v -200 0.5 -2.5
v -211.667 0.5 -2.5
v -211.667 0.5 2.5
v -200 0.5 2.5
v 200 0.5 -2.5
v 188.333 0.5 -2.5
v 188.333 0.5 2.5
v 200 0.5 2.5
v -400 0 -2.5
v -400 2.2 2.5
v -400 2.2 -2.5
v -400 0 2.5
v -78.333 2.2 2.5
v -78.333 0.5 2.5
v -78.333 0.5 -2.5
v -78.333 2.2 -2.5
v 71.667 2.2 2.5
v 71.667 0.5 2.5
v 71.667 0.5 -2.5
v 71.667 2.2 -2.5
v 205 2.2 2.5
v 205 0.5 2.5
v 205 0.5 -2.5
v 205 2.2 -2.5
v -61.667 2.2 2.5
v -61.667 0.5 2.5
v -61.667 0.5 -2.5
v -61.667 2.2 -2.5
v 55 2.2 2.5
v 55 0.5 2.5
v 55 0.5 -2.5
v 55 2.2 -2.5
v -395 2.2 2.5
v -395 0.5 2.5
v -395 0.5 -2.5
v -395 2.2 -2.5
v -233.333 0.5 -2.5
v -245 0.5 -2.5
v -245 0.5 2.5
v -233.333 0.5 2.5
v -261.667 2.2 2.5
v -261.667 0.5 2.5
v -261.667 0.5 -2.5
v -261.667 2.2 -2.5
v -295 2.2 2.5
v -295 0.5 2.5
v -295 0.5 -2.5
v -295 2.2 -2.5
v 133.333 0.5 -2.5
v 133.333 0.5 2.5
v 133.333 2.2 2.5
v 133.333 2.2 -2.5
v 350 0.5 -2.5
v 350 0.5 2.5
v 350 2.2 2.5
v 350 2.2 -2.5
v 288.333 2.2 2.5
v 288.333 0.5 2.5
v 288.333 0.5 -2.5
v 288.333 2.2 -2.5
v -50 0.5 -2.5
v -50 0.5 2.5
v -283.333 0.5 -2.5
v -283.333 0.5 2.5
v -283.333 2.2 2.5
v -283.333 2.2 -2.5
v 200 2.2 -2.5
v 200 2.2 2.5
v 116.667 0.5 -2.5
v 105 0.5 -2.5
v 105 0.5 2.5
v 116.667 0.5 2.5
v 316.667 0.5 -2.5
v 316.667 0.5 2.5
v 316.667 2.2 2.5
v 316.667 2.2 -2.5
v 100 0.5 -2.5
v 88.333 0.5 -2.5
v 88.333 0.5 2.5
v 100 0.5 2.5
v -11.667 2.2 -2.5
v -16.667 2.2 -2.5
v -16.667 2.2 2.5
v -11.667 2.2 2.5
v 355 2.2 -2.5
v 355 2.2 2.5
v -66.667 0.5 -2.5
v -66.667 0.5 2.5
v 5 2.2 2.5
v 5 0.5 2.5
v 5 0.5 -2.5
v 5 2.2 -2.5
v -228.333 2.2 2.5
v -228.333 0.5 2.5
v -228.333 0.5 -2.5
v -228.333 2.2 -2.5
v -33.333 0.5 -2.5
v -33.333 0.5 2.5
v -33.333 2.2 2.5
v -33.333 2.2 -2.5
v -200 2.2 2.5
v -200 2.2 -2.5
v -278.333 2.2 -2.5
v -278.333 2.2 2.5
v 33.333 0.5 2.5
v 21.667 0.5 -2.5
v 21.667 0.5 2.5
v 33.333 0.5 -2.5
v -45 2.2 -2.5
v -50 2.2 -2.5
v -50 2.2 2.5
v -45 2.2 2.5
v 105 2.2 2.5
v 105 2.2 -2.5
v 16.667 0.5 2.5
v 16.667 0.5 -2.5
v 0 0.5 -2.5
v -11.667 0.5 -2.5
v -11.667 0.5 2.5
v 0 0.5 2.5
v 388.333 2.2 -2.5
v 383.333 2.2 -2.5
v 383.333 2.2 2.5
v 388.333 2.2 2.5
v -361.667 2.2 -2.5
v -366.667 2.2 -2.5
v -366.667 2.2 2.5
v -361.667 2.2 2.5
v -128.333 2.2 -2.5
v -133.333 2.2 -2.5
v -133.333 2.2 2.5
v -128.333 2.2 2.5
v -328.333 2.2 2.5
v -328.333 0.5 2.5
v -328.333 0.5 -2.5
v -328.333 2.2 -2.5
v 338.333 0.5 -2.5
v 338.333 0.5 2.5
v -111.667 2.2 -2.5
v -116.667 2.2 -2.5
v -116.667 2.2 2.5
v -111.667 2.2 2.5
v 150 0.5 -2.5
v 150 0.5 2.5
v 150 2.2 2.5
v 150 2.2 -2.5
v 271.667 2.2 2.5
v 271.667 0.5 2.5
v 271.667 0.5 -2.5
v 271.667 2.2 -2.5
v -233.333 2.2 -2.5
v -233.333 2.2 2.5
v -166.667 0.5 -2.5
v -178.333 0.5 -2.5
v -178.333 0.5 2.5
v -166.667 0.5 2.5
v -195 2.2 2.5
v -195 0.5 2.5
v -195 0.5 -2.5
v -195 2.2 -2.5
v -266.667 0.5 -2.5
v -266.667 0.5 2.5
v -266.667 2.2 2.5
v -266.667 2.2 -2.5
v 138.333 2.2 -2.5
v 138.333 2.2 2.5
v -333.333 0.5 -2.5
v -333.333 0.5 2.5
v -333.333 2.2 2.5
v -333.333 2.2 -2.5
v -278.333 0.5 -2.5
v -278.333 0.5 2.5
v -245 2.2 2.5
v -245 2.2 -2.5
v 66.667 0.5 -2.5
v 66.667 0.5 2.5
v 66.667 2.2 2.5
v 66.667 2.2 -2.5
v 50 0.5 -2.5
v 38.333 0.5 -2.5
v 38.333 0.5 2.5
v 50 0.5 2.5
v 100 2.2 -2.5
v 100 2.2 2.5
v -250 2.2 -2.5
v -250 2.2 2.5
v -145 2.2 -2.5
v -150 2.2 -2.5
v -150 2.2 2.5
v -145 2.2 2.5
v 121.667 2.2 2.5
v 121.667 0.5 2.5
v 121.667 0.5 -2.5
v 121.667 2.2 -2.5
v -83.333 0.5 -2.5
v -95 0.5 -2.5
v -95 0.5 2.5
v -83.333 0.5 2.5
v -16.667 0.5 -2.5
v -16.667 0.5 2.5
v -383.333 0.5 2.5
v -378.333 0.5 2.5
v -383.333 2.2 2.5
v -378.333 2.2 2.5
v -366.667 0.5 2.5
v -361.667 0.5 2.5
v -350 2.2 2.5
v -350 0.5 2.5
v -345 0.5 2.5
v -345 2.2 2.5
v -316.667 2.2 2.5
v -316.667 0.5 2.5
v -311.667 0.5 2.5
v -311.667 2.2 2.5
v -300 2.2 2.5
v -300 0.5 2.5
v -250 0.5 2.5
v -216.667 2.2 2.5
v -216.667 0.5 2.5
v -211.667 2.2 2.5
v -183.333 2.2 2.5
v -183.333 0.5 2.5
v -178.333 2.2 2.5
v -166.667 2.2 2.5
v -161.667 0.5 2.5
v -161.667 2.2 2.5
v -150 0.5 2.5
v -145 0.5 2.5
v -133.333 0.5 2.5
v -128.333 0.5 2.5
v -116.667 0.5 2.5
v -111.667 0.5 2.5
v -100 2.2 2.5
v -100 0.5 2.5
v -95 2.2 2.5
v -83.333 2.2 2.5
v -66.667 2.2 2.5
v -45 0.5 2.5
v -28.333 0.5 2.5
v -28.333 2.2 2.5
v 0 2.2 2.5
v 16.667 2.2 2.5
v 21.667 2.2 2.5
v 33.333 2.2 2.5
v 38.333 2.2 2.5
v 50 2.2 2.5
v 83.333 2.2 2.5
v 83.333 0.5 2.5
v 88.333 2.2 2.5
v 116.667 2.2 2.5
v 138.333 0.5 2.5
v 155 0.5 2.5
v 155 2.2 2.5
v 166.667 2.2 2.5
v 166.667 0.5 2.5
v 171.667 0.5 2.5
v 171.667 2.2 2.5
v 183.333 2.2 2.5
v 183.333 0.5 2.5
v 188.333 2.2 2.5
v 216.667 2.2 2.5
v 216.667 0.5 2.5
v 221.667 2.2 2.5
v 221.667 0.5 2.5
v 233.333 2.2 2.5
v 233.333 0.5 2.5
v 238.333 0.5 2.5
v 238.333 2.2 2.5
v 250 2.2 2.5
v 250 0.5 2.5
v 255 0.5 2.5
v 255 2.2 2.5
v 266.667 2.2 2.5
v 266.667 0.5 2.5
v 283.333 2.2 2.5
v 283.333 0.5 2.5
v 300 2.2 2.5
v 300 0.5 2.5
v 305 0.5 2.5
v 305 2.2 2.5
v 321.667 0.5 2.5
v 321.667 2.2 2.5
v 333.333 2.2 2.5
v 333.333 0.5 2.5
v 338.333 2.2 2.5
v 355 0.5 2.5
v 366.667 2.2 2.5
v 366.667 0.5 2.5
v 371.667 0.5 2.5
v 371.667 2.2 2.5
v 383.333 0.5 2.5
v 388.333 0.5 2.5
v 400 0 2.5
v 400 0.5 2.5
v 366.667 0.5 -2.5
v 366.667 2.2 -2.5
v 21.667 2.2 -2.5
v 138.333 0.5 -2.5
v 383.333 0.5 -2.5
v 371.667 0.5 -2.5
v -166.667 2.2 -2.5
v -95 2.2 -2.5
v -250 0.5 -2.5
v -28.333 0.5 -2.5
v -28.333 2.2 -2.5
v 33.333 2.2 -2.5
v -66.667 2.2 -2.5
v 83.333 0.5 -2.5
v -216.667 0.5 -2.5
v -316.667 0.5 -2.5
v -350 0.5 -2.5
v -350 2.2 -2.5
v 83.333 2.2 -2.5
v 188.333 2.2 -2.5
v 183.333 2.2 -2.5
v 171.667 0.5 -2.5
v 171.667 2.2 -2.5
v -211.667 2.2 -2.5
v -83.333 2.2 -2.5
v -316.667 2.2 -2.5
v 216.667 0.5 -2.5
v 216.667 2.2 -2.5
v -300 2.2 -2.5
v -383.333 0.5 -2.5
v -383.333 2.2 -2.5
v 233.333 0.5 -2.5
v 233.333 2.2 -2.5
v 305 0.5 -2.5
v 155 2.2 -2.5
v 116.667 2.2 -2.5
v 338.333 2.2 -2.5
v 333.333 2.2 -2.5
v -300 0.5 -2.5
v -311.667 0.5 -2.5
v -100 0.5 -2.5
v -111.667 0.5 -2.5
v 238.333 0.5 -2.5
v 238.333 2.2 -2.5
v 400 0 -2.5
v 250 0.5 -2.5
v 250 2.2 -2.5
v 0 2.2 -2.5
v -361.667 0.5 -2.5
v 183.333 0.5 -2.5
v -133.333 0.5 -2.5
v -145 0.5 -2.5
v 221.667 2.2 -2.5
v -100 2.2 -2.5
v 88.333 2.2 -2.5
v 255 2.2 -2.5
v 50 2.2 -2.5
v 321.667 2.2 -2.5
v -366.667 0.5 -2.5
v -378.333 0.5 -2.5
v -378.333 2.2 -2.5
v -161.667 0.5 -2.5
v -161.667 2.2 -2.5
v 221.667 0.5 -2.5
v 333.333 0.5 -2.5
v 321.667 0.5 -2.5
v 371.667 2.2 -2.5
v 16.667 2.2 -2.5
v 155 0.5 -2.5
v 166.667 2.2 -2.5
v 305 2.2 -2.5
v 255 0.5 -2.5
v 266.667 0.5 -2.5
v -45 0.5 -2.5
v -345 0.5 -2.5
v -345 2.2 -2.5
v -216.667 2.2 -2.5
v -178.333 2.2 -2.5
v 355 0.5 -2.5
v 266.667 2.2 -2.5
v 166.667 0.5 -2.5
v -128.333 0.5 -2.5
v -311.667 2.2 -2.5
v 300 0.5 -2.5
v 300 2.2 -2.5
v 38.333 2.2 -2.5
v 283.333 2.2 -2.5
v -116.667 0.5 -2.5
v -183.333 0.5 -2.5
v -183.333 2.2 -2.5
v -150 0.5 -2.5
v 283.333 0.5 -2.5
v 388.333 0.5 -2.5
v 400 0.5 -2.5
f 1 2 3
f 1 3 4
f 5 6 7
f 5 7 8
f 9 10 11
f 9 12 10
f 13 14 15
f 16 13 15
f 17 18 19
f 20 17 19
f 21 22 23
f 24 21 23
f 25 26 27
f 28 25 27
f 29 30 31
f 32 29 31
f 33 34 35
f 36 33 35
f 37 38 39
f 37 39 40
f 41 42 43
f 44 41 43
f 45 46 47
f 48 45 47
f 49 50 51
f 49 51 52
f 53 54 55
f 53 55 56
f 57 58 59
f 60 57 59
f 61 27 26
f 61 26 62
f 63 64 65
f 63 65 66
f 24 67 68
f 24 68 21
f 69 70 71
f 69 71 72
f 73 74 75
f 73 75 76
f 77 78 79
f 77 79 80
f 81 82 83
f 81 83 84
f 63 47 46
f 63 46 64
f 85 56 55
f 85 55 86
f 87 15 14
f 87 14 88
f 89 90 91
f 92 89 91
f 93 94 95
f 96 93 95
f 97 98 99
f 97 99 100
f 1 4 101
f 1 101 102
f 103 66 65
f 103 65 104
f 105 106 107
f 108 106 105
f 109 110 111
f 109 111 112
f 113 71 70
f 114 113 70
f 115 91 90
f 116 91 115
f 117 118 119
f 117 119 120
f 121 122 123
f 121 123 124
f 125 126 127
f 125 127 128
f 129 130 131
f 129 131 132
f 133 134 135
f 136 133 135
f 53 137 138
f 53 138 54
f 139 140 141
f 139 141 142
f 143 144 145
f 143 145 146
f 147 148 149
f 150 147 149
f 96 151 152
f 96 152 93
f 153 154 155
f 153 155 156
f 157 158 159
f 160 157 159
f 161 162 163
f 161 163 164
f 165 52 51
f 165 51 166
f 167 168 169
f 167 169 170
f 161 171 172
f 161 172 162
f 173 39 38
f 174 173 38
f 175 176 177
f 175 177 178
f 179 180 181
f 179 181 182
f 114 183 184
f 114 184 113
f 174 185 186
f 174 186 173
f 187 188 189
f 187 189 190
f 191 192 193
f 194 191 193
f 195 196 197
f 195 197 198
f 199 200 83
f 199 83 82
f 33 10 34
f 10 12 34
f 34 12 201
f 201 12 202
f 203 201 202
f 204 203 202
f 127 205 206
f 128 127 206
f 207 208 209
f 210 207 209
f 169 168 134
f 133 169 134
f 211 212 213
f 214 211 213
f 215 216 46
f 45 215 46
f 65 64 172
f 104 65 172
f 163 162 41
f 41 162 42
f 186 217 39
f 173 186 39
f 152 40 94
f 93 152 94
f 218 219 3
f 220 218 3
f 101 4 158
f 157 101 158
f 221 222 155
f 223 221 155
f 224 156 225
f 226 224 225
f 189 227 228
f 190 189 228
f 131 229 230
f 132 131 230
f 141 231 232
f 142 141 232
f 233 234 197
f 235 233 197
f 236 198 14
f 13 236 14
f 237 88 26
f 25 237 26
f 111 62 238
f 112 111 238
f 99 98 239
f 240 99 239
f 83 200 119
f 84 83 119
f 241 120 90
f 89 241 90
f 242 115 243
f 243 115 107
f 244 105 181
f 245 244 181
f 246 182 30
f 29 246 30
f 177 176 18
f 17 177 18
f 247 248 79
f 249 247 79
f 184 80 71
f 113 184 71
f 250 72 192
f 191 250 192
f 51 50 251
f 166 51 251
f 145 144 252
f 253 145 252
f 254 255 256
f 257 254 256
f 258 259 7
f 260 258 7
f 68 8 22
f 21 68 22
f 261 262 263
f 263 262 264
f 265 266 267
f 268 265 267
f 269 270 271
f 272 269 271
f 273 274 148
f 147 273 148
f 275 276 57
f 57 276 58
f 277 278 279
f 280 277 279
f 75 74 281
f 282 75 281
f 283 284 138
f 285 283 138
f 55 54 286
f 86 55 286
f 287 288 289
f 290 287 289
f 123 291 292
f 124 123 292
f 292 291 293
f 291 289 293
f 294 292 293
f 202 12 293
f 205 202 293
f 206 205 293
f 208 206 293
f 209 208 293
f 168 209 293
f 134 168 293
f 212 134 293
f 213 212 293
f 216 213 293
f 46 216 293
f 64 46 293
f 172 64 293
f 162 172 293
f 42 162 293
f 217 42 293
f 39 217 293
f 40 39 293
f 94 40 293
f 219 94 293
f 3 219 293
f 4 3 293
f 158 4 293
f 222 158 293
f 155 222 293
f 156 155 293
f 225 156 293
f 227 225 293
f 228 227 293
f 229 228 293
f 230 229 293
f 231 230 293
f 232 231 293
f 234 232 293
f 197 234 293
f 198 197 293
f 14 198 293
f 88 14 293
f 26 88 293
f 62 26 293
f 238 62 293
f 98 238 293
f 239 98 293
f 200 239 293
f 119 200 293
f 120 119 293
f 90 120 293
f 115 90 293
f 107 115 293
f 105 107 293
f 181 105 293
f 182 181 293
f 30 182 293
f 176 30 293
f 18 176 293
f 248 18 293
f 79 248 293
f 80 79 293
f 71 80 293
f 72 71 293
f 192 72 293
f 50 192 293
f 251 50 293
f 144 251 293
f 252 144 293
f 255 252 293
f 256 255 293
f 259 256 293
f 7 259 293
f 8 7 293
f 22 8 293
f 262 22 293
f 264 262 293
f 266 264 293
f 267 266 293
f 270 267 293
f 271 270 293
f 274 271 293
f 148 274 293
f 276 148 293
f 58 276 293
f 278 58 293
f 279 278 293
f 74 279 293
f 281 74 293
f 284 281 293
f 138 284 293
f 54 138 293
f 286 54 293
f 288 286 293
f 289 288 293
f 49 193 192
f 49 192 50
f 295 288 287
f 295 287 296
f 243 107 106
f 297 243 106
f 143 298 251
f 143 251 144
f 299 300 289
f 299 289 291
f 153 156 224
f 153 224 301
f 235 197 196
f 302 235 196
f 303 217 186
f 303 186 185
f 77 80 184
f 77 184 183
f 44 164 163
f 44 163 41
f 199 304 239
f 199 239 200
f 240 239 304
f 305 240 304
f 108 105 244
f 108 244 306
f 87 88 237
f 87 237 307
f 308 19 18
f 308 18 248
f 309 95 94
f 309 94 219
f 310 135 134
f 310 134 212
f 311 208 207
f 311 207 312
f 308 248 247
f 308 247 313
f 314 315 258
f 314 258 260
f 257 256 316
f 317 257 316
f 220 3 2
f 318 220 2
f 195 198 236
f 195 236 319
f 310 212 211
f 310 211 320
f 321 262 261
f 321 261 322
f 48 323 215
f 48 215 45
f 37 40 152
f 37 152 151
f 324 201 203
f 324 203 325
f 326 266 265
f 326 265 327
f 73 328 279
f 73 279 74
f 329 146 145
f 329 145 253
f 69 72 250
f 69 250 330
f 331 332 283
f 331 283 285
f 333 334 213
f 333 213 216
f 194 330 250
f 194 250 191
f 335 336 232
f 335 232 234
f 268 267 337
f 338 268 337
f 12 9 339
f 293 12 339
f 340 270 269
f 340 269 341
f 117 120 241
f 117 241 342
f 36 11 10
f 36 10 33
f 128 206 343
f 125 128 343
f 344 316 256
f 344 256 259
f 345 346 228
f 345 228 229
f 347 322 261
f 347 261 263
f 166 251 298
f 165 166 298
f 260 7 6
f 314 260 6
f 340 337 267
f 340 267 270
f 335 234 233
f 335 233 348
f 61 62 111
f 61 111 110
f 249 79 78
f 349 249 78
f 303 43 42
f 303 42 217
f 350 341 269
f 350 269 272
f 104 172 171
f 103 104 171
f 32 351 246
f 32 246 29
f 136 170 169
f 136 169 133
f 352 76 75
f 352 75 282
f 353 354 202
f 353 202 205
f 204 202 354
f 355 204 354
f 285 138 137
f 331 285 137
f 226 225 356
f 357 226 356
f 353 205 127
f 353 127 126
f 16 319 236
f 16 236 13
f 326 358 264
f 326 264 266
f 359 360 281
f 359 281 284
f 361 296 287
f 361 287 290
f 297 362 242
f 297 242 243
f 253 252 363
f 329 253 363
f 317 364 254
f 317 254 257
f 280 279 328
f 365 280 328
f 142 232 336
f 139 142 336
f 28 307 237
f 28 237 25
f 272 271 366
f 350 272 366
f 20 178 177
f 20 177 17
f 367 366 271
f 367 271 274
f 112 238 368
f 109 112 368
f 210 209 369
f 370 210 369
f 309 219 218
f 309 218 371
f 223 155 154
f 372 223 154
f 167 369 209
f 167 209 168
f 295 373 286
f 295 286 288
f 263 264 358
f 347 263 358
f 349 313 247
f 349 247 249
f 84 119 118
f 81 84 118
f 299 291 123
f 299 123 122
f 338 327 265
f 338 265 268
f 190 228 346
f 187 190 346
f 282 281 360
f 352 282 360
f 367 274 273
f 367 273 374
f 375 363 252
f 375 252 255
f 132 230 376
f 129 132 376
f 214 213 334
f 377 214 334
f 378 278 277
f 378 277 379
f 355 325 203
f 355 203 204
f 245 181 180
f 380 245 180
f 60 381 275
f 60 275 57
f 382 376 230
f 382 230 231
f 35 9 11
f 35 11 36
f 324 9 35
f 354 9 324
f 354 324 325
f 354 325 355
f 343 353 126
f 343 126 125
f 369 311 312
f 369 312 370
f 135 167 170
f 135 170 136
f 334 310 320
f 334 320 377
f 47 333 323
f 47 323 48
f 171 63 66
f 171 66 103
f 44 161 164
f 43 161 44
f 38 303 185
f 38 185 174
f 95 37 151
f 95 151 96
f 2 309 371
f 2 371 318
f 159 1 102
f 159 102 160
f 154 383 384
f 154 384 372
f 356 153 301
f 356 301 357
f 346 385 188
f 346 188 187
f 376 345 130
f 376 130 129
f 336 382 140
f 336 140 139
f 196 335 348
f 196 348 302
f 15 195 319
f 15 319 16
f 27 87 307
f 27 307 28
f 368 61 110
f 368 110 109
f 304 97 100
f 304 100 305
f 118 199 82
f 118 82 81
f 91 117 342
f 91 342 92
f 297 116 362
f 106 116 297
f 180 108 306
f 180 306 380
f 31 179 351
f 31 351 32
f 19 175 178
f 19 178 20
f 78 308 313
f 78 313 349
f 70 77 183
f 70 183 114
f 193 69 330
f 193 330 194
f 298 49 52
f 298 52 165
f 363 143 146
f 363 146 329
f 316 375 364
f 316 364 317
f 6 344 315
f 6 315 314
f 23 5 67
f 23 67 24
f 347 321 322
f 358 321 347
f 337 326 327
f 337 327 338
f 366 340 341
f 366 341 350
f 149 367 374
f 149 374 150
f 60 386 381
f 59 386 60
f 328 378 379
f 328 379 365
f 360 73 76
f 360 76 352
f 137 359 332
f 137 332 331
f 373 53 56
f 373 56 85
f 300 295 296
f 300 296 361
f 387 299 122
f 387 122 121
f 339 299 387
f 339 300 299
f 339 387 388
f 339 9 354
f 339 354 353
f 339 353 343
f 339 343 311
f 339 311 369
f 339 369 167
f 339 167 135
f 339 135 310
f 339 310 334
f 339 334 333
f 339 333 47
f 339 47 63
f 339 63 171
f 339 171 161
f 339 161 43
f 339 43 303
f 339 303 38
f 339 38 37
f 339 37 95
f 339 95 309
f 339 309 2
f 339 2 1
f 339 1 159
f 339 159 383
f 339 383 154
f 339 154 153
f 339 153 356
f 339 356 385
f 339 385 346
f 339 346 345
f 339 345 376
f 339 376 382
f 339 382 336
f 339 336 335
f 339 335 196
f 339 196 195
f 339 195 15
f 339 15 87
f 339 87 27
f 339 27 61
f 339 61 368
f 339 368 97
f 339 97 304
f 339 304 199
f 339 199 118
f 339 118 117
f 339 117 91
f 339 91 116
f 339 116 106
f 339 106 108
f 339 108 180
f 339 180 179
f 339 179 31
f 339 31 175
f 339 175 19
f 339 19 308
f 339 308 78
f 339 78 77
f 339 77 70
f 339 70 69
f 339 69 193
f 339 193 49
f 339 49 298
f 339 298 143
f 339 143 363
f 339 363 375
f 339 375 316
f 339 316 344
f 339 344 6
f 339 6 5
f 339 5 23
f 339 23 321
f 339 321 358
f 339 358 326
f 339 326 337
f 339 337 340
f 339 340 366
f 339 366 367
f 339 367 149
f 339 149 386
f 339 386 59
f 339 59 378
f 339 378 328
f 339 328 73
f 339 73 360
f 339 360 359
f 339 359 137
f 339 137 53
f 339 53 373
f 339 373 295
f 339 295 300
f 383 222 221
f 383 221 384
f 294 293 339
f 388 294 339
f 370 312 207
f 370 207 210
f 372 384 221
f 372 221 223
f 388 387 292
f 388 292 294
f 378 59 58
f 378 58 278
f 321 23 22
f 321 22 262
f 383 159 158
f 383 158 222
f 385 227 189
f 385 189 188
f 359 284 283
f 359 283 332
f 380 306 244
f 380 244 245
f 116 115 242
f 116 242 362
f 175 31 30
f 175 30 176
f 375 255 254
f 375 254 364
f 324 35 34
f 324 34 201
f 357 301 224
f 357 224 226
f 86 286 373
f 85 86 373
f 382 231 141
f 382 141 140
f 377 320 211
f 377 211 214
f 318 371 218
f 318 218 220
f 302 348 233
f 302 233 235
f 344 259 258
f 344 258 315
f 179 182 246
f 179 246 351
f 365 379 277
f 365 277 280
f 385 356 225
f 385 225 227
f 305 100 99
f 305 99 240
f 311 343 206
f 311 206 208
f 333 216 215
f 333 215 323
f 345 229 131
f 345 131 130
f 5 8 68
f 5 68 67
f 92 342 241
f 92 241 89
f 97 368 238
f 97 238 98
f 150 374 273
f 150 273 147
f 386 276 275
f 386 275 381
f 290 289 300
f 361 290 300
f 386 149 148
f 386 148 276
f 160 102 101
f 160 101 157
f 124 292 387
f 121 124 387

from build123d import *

# Parameters (mm, degrees)
SKETCH_1_W             = 800
SKETCH_1_H             = 5
EXTRUDE_1_DEPTH        = 0.5
SKETCH_2_W             = 5
SKETCH_2_H             = 5
EXTRUDE_2_DEPTH        = 1.7
PATTERN_LINEAR_1_COUNT = 48
PATTERN_LINEAR_1_PITCH = 16.666666667


with BuildPart() as part:
    # 草图1 → 凸台-拉伸1 (new body)
    with BuildSketch(Plane(origin=(0, 0, 0), x_dir=(1, 0, 0), z_dir=(0, 1, 0))):
        Rectangle(SKETCH_1_W, SKETCH_1_H)
    extrude(amount=EXTRUDE_1_DEPTH)

    # 草图2 → 凸台-拉伸2 (add)
    with BuildSketch(Plane(origin=(0, 0.5, 0), x_dir=(1, 0, 0), z_dir=(0, 1, 0))):
        with Locations((-397.5, 0)):
            Rectangle(SKETCH_2_W, SKETCH_2_H)
    extrude_2 = extrude(amount=EXTRUDE_2_DEPTH)

    # 阵列(线性)1: 凸台-拉伸2 ×48
    with Locations(*[(i * PATTERN_LINEAR_1_PITCH, 0, 0) for i in range(1, PATTERN_LINEAR_1_COUNT)]):
        add(extrude_2)


solid = part.part
